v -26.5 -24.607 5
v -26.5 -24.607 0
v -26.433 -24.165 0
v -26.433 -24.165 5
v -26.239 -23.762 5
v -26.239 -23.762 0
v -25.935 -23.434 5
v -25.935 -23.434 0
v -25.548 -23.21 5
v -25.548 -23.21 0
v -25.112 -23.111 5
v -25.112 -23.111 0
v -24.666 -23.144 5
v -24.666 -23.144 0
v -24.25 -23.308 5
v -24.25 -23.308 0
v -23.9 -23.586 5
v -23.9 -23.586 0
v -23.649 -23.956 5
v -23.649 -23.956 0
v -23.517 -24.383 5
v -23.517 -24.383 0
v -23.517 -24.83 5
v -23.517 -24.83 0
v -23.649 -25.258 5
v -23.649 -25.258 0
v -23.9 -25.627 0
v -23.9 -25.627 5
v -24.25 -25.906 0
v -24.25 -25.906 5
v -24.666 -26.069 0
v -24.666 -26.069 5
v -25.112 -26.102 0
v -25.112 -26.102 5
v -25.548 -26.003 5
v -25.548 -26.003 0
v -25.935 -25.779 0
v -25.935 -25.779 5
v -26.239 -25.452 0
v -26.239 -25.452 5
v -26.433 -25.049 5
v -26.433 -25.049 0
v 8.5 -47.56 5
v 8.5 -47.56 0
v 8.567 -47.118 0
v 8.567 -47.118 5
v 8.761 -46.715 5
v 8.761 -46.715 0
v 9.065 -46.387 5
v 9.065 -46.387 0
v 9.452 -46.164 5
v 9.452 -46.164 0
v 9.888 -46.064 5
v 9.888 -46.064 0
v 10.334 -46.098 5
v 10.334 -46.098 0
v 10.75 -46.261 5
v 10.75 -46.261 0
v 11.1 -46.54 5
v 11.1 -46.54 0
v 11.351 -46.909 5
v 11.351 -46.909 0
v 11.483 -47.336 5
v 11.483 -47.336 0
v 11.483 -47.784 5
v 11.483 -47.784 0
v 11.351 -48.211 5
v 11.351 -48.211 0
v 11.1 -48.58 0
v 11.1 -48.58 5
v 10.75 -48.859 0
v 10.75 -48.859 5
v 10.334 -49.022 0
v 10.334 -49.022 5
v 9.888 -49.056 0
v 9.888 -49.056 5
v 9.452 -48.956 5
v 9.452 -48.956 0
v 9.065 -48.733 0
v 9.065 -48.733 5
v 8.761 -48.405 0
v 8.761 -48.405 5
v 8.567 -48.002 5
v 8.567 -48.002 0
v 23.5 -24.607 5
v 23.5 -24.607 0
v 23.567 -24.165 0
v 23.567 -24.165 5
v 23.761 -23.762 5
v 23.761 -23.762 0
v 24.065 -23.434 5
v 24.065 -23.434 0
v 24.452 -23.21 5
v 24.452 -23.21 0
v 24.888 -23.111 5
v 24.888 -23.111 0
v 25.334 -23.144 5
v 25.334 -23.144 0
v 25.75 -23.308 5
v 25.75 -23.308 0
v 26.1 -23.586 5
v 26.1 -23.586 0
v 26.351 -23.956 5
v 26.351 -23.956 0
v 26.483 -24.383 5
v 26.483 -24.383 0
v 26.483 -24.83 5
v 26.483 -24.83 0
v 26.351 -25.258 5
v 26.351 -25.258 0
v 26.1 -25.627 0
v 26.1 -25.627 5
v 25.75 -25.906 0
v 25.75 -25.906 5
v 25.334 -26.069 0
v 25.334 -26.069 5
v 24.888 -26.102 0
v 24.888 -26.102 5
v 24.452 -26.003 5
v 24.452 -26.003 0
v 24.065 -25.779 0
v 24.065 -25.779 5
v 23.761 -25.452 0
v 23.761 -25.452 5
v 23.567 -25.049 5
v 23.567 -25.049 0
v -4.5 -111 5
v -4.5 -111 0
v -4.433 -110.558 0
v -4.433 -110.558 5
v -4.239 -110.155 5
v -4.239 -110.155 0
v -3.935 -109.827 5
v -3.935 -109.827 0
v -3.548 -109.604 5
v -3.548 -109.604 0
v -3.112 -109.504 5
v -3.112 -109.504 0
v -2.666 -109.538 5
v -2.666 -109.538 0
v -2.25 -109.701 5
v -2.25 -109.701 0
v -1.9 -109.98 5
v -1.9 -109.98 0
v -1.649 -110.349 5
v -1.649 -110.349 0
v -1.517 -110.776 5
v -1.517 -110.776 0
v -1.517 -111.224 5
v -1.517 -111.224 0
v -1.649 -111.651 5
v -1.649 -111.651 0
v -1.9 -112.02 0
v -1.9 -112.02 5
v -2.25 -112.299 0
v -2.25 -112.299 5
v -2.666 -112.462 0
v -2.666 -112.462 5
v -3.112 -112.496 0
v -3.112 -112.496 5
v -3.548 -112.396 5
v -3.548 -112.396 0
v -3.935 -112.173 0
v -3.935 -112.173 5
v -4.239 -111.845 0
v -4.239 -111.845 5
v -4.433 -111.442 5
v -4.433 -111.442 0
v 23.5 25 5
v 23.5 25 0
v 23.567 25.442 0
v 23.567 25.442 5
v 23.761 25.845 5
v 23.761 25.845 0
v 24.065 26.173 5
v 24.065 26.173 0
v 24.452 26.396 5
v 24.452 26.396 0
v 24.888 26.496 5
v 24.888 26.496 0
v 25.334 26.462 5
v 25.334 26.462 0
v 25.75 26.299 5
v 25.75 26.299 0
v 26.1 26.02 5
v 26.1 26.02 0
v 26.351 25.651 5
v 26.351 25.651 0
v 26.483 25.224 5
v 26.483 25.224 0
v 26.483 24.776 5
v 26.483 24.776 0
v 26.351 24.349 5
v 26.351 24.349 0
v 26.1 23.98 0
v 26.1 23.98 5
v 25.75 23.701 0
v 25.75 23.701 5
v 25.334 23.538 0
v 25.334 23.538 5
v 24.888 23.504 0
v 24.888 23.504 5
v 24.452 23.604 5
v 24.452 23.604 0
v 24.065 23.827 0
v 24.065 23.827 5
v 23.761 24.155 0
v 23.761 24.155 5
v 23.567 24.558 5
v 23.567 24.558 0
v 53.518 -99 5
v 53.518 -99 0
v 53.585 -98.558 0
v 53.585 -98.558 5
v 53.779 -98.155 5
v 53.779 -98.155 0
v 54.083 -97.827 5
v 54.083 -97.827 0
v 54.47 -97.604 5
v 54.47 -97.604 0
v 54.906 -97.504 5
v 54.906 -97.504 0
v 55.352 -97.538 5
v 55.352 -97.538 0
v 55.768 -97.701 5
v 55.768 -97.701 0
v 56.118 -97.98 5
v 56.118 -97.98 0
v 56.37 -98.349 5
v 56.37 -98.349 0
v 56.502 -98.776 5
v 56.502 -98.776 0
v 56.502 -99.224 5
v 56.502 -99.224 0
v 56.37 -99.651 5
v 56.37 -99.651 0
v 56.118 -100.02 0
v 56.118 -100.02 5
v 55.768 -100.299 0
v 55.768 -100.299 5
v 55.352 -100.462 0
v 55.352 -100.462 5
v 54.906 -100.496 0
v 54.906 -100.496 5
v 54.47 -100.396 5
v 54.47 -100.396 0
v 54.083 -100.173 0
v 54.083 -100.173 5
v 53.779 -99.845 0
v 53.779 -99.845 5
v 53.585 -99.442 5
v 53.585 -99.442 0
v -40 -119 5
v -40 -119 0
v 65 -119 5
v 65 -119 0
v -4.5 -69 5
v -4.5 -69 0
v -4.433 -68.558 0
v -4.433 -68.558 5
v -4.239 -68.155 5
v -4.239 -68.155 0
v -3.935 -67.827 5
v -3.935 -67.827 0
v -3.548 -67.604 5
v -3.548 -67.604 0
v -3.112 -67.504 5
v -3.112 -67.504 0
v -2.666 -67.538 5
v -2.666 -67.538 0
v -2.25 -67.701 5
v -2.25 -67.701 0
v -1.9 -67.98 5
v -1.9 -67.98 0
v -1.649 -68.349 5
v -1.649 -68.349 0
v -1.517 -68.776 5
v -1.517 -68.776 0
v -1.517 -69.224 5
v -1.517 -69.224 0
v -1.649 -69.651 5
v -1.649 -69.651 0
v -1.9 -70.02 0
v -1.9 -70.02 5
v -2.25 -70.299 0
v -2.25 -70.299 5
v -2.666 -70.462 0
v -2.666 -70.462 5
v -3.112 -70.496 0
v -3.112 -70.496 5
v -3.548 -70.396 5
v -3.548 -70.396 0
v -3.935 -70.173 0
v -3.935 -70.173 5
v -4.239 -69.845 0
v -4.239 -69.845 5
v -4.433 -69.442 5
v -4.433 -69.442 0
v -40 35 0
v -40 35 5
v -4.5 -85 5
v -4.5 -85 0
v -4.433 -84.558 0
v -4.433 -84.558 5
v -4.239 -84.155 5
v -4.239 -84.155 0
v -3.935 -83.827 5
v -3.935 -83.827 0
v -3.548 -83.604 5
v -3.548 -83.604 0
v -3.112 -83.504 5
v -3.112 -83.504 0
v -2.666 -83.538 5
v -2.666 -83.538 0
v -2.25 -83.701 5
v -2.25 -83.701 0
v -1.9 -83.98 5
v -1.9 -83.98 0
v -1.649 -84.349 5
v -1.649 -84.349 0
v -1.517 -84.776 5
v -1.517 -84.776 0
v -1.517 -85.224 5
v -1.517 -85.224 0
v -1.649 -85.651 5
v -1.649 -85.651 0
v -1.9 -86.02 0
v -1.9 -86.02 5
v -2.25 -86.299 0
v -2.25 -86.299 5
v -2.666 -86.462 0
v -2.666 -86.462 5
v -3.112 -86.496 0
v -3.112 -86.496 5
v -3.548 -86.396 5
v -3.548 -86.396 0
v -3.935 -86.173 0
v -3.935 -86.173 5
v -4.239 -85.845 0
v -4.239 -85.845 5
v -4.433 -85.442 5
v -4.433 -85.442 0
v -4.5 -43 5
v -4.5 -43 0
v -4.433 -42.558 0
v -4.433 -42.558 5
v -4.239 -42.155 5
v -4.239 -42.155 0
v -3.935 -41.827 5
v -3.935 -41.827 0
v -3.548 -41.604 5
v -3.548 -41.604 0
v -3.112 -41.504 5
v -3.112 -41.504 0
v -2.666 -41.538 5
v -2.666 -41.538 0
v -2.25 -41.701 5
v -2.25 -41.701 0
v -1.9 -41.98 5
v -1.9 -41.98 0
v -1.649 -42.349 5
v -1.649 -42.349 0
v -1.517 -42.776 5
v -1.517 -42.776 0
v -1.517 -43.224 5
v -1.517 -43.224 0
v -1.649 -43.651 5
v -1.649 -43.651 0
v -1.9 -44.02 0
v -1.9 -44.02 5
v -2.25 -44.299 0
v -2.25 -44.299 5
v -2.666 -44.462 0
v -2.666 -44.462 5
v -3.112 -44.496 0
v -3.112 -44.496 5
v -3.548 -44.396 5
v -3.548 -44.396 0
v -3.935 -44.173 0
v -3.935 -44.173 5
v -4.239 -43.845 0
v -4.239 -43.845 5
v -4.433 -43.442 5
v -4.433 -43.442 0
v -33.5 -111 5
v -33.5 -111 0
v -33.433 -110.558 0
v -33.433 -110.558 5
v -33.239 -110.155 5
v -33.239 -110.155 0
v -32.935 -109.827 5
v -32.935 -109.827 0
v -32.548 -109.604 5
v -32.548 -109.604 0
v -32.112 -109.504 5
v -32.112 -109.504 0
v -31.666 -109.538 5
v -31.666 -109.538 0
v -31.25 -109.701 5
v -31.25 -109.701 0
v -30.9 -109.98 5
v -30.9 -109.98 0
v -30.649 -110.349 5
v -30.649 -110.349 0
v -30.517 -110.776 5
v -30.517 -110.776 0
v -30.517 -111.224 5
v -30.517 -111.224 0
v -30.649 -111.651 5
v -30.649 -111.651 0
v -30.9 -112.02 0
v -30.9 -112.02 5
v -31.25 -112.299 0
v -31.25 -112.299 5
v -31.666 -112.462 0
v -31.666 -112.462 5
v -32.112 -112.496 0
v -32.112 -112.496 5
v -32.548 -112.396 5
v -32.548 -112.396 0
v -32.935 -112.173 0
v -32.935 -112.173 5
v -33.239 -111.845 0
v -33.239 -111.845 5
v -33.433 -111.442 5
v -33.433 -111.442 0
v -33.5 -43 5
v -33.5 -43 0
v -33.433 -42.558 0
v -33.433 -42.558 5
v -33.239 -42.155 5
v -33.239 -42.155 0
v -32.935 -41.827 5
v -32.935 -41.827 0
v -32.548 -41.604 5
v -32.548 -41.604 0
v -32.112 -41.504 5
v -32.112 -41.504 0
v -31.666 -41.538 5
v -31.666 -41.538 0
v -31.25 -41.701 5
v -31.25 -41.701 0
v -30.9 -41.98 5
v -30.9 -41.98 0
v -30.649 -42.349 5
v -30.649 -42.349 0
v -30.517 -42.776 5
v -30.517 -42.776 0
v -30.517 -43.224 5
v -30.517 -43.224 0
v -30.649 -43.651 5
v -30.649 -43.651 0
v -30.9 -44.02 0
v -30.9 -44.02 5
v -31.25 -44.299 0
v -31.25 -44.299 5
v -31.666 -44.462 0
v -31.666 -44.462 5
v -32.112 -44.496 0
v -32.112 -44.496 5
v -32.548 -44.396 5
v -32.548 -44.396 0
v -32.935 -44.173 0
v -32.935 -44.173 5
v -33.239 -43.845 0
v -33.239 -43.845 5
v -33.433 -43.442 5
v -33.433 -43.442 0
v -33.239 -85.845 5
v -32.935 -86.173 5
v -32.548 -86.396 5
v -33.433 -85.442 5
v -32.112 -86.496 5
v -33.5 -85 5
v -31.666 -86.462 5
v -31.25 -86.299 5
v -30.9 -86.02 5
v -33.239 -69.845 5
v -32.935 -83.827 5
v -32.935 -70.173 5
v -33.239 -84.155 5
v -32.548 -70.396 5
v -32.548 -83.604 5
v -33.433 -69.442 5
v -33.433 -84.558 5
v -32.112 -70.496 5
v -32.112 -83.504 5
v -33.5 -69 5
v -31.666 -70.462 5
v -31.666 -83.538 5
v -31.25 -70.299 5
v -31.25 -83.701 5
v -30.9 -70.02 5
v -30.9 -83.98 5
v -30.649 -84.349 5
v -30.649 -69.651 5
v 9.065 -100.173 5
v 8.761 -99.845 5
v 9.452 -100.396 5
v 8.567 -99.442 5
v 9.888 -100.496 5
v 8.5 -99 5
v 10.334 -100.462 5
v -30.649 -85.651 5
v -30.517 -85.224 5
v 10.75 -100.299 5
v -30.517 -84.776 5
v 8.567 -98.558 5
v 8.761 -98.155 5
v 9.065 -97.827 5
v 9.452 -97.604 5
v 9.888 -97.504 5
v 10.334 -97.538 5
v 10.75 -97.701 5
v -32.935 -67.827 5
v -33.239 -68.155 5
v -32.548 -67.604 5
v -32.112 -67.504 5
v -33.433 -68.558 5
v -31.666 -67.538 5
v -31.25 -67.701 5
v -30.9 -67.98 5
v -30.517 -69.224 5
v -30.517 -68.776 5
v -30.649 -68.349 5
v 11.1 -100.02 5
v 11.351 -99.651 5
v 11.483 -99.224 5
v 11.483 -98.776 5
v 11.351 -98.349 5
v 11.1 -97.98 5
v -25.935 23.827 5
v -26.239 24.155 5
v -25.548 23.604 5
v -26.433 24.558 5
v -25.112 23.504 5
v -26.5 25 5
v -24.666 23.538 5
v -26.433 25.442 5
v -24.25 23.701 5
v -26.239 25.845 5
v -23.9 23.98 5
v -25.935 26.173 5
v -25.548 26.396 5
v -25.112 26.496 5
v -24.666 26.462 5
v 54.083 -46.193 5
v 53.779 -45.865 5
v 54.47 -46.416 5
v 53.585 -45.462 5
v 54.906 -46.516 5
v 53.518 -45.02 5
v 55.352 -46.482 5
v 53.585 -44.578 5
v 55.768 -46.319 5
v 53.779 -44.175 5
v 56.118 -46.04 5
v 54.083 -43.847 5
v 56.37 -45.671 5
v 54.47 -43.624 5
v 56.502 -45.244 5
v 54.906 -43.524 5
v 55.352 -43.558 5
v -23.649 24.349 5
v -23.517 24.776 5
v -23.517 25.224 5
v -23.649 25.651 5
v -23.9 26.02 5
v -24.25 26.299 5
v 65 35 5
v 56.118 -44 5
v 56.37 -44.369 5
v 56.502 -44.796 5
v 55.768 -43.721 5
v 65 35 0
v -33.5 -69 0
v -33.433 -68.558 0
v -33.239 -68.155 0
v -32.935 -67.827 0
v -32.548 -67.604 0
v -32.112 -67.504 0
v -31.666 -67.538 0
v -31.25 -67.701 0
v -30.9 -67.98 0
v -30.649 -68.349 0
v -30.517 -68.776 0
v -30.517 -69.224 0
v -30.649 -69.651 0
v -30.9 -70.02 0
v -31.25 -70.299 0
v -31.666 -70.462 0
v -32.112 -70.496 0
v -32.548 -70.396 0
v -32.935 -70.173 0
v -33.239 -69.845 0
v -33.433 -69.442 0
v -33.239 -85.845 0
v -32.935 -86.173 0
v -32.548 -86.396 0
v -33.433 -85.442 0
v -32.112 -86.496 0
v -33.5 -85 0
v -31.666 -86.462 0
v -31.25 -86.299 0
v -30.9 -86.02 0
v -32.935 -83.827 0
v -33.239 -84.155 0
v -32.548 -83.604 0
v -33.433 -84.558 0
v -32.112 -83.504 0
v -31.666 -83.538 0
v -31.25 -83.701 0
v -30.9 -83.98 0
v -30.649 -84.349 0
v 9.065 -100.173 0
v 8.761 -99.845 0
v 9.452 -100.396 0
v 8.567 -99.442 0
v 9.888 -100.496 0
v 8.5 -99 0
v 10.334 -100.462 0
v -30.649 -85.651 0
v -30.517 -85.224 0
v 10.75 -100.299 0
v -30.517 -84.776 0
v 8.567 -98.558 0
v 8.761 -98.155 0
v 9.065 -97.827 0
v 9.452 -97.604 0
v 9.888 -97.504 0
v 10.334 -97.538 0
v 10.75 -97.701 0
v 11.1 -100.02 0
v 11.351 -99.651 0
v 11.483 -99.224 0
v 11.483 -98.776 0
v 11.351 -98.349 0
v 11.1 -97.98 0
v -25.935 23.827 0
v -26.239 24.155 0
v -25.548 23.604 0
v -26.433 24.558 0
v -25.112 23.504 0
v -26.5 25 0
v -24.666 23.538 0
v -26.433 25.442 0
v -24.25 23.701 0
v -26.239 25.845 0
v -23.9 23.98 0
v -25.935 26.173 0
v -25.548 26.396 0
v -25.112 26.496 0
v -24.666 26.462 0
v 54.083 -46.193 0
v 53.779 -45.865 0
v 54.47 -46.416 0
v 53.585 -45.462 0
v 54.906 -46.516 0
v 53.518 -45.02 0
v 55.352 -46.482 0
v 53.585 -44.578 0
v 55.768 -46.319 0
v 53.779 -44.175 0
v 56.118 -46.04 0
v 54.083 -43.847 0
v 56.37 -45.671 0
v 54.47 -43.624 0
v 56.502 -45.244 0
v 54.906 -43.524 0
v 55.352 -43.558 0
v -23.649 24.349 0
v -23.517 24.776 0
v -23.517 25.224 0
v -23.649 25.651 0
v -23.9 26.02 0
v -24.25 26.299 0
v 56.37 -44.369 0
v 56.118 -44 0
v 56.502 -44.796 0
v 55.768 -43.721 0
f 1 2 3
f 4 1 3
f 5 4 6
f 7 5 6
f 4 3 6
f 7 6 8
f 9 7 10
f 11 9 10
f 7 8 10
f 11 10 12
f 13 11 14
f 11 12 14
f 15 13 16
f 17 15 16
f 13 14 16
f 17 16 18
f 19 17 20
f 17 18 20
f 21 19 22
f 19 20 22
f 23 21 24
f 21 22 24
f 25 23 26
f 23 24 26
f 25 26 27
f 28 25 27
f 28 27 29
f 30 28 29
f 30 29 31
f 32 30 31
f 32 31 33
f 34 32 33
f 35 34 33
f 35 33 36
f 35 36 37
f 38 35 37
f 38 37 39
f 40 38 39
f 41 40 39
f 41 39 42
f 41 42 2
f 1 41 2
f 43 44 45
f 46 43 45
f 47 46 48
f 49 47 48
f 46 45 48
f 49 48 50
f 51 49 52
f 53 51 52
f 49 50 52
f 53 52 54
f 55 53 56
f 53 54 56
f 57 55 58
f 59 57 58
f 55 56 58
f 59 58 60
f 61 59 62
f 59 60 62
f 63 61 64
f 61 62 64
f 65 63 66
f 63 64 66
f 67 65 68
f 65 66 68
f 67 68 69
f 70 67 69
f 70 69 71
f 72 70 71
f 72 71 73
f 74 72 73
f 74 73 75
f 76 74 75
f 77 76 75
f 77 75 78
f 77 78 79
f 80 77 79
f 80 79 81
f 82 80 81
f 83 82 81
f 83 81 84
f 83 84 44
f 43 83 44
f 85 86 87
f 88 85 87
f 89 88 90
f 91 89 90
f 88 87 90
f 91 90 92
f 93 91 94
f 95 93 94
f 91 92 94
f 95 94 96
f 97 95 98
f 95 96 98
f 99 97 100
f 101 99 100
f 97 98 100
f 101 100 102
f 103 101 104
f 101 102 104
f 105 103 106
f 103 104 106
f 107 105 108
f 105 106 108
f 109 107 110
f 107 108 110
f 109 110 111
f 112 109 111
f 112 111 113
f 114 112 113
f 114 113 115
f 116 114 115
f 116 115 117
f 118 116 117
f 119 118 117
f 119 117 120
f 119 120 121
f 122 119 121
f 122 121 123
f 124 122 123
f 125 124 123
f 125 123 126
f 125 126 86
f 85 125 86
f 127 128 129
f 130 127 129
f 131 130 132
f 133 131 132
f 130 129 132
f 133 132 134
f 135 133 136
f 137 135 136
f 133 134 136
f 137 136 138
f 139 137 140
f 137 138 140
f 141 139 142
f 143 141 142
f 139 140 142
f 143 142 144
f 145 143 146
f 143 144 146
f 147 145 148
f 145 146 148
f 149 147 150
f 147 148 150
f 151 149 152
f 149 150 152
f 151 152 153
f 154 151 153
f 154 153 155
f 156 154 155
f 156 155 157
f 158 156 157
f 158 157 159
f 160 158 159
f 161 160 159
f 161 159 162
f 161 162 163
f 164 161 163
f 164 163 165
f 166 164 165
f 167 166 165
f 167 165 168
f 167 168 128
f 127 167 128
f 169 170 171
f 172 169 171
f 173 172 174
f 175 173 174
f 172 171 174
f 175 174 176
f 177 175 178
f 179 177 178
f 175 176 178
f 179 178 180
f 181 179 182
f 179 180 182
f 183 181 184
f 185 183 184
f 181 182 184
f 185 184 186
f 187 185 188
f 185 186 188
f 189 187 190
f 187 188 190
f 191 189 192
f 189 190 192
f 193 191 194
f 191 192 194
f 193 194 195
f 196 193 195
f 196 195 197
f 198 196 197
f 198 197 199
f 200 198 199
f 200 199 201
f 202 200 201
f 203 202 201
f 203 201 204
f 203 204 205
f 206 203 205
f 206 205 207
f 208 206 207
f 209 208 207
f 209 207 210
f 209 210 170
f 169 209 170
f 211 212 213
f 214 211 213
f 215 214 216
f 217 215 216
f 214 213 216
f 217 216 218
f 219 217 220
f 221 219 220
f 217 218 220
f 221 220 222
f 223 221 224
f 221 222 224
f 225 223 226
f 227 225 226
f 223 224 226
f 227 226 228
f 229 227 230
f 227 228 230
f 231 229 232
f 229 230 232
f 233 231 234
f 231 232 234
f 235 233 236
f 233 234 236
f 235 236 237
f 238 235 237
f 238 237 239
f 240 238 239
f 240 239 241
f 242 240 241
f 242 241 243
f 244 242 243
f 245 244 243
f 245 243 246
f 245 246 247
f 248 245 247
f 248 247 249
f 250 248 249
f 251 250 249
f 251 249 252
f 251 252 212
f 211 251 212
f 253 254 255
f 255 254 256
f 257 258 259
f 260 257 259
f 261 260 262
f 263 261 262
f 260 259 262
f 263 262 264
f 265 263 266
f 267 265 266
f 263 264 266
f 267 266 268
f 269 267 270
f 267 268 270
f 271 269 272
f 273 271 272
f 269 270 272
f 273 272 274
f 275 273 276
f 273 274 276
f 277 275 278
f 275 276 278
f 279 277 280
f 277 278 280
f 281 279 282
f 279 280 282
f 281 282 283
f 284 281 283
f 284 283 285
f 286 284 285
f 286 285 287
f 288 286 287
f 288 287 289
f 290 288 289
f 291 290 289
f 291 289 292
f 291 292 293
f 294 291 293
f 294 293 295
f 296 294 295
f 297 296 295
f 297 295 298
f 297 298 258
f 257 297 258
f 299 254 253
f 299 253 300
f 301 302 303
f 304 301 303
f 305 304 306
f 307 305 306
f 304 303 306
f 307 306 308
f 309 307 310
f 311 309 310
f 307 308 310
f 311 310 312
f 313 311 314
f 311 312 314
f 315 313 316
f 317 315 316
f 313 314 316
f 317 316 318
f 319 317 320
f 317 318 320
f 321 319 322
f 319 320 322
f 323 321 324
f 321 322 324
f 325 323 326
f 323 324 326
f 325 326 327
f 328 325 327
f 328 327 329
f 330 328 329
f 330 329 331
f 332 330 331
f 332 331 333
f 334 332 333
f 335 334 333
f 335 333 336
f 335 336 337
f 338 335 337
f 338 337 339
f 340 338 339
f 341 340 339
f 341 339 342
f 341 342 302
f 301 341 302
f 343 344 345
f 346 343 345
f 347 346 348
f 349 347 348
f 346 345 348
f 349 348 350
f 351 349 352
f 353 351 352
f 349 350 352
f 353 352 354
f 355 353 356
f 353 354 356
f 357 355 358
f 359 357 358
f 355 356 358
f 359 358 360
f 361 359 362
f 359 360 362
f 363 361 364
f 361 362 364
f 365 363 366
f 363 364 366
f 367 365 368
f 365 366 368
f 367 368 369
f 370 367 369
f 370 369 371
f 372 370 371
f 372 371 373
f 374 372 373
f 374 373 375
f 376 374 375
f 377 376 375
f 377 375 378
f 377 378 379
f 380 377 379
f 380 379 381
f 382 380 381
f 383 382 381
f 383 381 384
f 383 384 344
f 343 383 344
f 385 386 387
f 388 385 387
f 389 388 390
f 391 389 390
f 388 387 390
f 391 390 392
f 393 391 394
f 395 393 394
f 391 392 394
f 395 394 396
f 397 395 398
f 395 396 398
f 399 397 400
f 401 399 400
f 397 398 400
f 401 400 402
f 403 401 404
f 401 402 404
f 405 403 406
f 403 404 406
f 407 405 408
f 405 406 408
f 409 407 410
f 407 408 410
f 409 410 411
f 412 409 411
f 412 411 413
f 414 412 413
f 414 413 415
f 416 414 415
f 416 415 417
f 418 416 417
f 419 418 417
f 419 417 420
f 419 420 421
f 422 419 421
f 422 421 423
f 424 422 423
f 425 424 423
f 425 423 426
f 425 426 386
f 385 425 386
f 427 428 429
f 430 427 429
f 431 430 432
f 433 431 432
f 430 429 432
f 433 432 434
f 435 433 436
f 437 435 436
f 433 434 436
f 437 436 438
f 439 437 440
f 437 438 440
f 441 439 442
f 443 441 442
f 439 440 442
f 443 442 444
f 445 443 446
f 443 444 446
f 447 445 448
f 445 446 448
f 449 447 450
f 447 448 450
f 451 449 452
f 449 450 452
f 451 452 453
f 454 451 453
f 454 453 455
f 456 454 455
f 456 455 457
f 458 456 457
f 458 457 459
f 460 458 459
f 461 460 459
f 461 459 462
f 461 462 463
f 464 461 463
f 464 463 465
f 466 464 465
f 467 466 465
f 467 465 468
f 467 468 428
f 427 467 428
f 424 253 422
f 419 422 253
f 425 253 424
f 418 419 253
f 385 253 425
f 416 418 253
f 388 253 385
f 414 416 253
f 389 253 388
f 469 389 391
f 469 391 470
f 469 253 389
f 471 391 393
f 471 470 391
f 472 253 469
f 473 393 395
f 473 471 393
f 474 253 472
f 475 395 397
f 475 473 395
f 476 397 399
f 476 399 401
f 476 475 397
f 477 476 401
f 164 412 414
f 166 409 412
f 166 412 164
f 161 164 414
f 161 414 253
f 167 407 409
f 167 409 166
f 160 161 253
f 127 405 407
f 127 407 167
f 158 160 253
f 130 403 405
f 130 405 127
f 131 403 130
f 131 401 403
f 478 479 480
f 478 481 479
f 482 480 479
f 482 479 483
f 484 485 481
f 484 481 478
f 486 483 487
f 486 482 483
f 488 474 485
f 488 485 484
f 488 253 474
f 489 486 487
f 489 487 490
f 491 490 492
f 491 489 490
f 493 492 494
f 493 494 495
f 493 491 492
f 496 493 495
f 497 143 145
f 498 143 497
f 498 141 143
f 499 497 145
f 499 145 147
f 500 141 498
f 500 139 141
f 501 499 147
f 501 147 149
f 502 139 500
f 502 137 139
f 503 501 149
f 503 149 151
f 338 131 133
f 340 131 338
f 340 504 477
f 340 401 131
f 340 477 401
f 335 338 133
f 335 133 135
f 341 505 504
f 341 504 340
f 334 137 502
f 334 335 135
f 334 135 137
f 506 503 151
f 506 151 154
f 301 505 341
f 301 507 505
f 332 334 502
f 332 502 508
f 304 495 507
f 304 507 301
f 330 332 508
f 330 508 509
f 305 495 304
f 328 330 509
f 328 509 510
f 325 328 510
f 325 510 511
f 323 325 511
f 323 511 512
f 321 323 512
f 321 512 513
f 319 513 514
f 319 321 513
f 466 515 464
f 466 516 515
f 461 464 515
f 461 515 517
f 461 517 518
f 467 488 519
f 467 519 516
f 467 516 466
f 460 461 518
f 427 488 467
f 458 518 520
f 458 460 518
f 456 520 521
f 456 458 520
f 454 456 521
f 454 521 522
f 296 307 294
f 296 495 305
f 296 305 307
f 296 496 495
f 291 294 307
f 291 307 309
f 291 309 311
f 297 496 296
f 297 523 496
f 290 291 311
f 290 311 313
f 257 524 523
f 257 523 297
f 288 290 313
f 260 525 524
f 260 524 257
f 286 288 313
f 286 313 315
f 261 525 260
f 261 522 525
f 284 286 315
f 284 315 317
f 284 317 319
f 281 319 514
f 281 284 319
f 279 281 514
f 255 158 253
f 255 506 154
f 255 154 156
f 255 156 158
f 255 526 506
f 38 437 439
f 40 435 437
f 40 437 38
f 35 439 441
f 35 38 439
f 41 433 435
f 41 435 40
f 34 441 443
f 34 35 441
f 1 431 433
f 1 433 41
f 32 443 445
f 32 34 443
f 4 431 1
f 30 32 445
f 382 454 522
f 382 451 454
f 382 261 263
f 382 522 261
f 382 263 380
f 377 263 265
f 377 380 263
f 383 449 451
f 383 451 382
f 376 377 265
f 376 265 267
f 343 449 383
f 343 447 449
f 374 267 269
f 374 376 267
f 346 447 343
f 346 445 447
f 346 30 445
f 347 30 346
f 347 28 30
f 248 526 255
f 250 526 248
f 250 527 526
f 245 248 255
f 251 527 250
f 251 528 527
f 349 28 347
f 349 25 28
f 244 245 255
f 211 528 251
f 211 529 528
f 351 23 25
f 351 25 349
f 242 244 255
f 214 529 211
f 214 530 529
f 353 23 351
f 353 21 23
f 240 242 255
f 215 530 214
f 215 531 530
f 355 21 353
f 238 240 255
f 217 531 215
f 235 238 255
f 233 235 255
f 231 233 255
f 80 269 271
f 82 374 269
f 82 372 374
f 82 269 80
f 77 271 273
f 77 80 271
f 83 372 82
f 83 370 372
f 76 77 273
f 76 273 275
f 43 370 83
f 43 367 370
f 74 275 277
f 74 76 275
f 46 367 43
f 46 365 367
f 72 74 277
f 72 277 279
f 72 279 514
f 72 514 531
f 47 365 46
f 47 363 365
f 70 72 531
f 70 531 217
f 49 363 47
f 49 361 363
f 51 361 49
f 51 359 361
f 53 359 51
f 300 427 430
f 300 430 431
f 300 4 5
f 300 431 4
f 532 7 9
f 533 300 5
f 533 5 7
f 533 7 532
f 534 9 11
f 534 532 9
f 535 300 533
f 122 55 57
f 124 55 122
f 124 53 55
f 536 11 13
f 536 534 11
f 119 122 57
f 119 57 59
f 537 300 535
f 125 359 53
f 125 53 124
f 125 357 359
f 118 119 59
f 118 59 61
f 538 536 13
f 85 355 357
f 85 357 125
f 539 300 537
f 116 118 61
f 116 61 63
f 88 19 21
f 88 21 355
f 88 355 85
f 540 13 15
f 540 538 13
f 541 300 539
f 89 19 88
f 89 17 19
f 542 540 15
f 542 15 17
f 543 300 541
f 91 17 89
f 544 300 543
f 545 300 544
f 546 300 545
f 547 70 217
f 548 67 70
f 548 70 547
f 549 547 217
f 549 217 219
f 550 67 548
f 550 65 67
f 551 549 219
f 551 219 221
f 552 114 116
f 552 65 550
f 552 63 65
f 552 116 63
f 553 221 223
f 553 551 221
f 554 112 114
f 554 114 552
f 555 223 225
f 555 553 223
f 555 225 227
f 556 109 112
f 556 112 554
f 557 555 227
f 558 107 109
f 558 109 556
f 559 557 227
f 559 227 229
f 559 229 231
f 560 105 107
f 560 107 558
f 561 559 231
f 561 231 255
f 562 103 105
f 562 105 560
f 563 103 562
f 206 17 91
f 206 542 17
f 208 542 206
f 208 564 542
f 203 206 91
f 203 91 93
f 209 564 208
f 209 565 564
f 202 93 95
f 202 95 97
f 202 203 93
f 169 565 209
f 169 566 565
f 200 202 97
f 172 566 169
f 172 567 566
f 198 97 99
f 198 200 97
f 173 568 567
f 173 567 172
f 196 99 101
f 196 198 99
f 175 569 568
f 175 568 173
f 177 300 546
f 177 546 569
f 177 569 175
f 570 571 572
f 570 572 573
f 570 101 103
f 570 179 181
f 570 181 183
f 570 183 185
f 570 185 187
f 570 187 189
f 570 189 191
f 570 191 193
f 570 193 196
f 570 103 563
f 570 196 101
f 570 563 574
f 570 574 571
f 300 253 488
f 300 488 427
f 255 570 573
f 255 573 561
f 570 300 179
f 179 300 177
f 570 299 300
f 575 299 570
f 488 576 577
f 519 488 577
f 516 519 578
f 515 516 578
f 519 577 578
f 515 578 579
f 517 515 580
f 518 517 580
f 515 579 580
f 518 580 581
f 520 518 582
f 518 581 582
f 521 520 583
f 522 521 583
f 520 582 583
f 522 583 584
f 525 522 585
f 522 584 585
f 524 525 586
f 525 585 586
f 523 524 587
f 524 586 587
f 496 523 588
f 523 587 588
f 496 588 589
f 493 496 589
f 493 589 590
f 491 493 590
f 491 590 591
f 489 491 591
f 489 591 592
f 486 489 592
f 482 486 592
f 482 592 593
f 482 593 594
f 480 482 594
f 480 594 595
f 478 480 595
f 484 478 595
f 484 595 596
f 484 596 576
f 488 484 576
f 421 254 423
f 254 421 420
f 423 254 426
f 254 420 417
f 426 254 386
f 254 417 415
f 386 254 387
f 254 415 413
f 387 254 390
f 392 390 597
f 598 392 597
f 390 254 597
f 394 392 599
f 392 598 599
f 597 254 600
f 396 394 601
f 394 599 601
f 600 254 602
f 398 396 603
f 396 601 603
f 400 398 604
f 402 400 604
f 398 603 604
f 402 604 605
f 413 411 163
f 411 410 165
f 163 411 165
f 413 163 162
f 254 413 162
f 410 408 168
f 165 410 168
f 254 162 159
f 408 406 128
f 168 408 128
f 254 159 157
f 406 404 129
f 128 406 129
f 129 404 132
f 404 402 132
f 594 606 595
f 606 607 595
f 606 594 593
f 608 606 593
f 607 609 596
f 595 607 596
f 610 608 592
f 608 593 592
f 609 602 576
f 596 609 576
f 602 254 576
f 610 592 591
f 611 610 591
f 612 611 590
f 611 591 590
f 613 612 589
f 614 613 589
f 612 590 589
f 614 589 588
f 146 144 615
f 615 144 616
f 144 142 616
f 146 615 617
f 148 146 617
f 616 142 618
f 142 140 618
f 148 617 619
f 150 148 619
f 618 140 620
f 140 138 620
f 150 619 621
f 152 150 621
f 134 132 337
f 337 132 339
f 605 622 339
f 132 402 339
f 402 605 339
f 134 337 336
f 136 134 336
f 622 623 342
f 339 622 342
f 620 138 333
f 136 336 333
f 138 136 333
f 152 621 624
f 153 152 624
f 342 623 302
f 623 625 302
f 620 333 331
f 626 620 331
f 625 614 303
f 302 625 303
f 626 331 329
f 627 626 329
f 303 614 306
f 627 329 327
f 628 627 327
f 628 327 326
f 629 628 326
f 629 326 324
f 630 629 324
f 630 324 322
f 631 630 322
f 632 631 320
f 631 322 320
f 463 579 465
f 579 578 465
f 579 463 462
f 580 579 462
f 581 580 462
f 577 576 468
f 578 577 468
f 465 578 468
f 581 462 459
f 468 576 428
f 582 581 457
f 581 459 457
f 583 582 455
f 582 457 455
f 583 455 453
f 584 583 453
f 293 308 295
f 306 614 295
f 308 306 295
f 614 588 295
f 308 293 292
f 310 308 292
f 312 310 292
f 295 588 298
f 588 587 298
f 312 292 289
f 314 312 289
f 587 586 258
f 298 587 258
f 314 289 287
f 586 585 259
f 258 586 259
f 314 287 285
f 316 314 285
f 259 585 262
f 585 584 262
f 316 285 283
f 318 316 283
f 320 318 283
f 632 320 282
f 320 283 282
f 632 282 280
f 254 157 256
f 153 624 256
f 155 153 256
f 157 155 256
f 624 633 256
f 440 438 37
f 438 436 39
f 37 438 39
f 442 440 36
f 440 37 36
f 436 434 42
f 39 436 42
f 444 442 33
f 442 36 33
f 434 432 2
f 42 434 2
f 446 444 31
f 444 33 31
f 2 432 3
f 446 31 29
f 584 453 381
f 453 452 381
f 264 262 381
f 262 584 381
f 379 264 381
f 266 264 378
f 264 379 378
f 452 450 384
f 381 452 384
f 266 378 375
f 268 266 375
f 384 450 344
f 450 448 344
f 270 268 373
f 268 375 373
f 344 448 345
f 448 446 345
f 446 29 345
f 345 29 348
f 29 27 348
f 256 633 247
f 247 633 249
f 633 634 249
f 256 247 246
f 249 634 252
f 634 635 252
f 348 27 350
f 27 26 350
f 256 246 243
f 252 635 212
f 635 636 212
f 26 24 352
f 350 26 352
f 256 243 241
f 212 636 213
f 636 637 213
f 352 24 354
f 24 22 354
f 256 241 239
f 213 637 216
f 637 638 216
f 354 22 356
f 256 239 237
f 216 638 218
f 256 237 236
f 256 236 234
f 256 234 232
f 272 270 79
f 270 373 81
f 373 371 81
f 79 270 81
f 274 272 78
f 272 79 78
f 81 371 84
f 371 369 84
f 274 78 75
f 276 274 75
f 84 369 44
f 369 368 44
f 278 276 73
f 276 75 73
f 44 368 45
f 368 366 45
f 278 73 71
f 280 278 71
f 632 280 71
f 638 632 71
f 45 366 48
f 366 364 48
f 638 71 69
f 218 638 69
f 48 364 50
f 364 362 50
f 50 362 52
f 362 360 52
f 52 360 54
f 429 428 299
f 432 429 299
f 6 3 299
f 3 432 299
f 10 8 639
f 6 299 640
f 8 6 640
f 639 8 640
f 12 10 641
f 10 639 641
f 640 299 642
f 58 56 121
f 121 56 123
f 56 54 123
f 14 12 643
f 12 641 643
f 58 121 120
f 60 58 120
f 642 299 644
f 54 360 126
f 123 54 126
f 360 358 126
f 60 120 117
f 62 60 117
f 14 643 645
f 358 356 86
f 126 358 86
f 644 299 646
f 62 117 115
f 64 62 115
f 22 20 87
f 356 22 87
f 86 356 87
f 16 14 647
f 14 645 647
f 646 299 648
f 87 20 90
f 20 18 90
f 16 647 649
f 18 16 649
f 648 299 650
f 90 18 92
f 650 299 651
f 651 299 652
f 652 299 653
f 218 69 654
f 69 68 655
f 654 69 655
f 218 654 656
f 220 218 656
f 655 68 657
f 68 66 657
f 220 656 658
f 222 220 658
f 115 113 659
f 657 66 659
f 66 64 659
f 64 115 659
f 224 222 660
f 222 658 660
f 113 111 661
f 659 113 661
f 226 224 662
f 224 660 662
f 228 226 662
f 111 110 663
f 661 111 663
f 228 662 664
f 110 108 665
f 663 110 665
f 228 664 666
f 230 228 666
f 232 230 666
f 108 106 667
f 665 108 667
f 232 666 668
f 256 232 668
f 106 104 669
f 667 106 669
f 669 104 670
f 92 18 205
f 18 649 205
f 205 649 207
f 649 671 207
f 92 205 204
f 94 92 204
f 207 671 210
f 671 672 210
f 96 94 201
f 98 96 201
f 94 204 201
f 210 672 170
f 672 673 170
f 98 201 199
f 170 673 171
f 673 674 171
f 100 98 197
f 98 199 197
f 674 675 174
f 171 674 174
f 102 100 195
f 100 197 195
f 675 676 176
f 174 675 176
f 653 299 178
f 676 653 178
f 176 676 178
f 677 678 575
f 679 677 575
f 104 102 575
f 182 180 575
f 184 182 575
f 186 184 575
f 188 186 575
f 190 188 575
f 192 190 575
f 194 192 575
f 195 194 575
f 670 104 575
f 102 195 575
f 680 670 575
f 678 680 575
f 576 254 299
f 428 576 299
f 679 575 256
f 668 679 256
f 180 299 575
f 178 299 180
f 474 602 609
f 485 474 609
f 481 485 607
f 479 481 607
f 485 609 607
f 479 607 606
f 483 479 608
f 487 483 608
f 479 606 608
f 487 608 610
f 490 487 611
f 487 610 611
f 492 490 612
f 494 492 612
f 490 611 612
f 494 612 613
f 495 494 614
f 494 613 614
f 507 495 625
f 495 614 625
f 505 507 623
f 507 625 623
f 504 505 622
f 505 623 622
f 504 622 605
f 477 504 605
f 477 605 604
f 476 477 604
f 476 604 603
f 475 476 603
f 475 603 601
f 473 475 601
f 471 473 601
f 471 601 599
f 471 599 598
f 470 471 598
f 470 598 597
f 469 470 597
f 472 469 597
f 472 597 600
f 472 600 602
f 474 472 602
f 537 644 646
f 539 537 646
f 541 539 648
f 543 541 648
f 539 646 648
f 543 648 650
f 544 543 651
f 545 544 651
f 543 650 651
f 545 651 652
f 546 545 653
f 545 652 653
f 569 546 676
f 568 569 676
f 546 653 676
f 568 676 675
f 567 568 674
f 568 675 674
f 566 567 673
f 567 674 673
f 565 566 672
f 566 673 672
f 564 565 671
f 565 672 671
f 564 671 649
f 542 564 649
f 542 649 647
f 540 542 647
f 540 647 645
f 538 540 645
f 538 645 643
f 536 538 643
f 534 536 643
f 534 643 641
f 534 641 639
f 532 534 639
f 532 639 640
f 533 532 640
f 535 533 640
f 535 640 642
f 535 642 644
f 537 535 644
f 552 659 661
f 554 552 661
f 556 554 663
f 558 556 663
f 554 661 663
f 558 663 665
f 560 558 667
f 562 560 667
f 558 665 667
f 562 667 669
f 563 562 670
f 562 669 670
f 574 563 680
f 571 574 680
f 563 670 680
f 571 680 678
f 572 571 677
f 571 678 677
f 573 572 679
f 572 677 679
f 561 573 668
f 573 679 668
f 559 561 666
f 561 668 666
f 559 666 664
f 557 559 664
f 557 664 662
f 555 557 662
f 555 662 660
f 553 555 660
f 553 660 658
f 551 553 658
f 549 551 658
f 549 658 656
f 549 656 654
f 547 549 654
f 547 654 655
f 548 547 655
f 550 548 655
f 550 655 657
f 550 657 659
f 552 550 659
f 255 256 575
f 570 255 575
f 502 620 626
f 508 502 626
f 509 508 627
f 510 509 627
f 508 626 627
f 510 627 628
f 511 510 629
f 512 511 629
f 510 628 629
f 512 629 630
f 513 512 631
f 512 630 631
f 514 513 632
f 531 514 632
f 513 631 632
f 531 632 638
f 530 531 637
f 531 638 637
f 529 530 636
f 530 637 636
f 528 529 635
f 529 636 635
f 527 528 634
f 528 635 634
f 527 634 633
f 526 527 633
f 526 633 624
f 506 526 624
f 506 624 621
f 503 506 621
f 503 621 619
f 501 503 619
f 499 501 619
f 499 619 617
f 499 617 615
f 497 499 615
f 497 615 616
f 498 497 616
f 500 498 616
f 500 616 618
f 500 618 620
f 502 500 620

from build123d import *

# Parameters (mm, degrees)
SKETCH1_W           = 105
SKETCH1_H           = 154
BOSS_EXTRUDE1_DEPTH = 5
SKETCH3_R           = 1.5
CUT_EXTRUDE1_DEPTH  = 10
SKETCH4_R           = 1.5
CUT_EXTRUDE2_DEPTH  = 6
SKETCH6_R           = 1.5
CUT_EXTRUDE4_DEPTH  = 6


with BuildPart() as part:
    # Sketch1 → Boss-Extrude1 (new body)
    with BuildSketch(Plane.XY):
        with Locations((12.5, -42)):
            Rectangle(SKETCH1_W, SKETCH1_H)
    extrude(amount=BOSS_EXTRUDE1_DEPTH)

    # Sketch3 → Cut-Extrude1 (cut)
    with BuildSketch(Plane(origin=(0, 0, 0), x_dir=(-1, 0, 0), z_dir=(0, 0, -1))):
        with Locations((32, -43)):
            Circle(SKETCH3_R)
        with Locations((32, -85)):
            Circle(SKETCH3_R)
        with Locations((3, -111)):
            Circle(SKETCH3_R)
        with Locations((3, -43)):
            Circle(SKETCH3_R)
        with Locations((32, -111)):
            Circle(SKETCH3_R)
        with Locations((3, -85)):
            Circle(SKETCH3_R)
        with Locations((3, -69)):
            Circle(SKETCH3_R)
        with Locations((32, -69)):
            Circle(SKETCH3_R)
    extrude(amount=-CUT_EXTRUDE1_DEPTH, mode=Mode.SUBTRACT)

    # Sketch4 → Cut-Extrude2 (cut, through all)
    with BuildSketch(Plane(origin=(0, 0, 0), x_dir=(-1, 0, 0), z_dir=(0, 0, -1))):
        with Locations((-25, 25)):
            Circle(SKETCH4_R)
        with Locations((25, 25)):
            Circle(SKETCH4_R)
        with Locations((25, -24.60667729)):
            Circle(SKETCH4_R)
        with Locations((-25, -24.60667729)):
            Circle(SKETCH4_R)
    extrude(amount=-CUT_EXTRUDE2_DEPTH, mode=Mode.SUBTRACT)

    # Sketch6 → Cut-Extrude4 (cut, through all)
    with BuildSketch(Plane(origin=(0, 0, 0), x_dir=(-1, 0, 0), z_dir=(0, 0, -1))):
        with Locations((-10, -47.56)):
            Circle(SKETCH6_R)
        with Locations((-55.018401793, -45.02)):
            Circle(SKETCH6_R)
        with Locations((-55.018401793, -99)):
            Circle(SKETCH6_R)
        with Locations((-10, -99)):
            Circle(SKETCH6_R)
    extrude(amount=-CUT_EXTRUDE4_DEPTH, mode=Mode.SUBTRACT)


solid = part.part
